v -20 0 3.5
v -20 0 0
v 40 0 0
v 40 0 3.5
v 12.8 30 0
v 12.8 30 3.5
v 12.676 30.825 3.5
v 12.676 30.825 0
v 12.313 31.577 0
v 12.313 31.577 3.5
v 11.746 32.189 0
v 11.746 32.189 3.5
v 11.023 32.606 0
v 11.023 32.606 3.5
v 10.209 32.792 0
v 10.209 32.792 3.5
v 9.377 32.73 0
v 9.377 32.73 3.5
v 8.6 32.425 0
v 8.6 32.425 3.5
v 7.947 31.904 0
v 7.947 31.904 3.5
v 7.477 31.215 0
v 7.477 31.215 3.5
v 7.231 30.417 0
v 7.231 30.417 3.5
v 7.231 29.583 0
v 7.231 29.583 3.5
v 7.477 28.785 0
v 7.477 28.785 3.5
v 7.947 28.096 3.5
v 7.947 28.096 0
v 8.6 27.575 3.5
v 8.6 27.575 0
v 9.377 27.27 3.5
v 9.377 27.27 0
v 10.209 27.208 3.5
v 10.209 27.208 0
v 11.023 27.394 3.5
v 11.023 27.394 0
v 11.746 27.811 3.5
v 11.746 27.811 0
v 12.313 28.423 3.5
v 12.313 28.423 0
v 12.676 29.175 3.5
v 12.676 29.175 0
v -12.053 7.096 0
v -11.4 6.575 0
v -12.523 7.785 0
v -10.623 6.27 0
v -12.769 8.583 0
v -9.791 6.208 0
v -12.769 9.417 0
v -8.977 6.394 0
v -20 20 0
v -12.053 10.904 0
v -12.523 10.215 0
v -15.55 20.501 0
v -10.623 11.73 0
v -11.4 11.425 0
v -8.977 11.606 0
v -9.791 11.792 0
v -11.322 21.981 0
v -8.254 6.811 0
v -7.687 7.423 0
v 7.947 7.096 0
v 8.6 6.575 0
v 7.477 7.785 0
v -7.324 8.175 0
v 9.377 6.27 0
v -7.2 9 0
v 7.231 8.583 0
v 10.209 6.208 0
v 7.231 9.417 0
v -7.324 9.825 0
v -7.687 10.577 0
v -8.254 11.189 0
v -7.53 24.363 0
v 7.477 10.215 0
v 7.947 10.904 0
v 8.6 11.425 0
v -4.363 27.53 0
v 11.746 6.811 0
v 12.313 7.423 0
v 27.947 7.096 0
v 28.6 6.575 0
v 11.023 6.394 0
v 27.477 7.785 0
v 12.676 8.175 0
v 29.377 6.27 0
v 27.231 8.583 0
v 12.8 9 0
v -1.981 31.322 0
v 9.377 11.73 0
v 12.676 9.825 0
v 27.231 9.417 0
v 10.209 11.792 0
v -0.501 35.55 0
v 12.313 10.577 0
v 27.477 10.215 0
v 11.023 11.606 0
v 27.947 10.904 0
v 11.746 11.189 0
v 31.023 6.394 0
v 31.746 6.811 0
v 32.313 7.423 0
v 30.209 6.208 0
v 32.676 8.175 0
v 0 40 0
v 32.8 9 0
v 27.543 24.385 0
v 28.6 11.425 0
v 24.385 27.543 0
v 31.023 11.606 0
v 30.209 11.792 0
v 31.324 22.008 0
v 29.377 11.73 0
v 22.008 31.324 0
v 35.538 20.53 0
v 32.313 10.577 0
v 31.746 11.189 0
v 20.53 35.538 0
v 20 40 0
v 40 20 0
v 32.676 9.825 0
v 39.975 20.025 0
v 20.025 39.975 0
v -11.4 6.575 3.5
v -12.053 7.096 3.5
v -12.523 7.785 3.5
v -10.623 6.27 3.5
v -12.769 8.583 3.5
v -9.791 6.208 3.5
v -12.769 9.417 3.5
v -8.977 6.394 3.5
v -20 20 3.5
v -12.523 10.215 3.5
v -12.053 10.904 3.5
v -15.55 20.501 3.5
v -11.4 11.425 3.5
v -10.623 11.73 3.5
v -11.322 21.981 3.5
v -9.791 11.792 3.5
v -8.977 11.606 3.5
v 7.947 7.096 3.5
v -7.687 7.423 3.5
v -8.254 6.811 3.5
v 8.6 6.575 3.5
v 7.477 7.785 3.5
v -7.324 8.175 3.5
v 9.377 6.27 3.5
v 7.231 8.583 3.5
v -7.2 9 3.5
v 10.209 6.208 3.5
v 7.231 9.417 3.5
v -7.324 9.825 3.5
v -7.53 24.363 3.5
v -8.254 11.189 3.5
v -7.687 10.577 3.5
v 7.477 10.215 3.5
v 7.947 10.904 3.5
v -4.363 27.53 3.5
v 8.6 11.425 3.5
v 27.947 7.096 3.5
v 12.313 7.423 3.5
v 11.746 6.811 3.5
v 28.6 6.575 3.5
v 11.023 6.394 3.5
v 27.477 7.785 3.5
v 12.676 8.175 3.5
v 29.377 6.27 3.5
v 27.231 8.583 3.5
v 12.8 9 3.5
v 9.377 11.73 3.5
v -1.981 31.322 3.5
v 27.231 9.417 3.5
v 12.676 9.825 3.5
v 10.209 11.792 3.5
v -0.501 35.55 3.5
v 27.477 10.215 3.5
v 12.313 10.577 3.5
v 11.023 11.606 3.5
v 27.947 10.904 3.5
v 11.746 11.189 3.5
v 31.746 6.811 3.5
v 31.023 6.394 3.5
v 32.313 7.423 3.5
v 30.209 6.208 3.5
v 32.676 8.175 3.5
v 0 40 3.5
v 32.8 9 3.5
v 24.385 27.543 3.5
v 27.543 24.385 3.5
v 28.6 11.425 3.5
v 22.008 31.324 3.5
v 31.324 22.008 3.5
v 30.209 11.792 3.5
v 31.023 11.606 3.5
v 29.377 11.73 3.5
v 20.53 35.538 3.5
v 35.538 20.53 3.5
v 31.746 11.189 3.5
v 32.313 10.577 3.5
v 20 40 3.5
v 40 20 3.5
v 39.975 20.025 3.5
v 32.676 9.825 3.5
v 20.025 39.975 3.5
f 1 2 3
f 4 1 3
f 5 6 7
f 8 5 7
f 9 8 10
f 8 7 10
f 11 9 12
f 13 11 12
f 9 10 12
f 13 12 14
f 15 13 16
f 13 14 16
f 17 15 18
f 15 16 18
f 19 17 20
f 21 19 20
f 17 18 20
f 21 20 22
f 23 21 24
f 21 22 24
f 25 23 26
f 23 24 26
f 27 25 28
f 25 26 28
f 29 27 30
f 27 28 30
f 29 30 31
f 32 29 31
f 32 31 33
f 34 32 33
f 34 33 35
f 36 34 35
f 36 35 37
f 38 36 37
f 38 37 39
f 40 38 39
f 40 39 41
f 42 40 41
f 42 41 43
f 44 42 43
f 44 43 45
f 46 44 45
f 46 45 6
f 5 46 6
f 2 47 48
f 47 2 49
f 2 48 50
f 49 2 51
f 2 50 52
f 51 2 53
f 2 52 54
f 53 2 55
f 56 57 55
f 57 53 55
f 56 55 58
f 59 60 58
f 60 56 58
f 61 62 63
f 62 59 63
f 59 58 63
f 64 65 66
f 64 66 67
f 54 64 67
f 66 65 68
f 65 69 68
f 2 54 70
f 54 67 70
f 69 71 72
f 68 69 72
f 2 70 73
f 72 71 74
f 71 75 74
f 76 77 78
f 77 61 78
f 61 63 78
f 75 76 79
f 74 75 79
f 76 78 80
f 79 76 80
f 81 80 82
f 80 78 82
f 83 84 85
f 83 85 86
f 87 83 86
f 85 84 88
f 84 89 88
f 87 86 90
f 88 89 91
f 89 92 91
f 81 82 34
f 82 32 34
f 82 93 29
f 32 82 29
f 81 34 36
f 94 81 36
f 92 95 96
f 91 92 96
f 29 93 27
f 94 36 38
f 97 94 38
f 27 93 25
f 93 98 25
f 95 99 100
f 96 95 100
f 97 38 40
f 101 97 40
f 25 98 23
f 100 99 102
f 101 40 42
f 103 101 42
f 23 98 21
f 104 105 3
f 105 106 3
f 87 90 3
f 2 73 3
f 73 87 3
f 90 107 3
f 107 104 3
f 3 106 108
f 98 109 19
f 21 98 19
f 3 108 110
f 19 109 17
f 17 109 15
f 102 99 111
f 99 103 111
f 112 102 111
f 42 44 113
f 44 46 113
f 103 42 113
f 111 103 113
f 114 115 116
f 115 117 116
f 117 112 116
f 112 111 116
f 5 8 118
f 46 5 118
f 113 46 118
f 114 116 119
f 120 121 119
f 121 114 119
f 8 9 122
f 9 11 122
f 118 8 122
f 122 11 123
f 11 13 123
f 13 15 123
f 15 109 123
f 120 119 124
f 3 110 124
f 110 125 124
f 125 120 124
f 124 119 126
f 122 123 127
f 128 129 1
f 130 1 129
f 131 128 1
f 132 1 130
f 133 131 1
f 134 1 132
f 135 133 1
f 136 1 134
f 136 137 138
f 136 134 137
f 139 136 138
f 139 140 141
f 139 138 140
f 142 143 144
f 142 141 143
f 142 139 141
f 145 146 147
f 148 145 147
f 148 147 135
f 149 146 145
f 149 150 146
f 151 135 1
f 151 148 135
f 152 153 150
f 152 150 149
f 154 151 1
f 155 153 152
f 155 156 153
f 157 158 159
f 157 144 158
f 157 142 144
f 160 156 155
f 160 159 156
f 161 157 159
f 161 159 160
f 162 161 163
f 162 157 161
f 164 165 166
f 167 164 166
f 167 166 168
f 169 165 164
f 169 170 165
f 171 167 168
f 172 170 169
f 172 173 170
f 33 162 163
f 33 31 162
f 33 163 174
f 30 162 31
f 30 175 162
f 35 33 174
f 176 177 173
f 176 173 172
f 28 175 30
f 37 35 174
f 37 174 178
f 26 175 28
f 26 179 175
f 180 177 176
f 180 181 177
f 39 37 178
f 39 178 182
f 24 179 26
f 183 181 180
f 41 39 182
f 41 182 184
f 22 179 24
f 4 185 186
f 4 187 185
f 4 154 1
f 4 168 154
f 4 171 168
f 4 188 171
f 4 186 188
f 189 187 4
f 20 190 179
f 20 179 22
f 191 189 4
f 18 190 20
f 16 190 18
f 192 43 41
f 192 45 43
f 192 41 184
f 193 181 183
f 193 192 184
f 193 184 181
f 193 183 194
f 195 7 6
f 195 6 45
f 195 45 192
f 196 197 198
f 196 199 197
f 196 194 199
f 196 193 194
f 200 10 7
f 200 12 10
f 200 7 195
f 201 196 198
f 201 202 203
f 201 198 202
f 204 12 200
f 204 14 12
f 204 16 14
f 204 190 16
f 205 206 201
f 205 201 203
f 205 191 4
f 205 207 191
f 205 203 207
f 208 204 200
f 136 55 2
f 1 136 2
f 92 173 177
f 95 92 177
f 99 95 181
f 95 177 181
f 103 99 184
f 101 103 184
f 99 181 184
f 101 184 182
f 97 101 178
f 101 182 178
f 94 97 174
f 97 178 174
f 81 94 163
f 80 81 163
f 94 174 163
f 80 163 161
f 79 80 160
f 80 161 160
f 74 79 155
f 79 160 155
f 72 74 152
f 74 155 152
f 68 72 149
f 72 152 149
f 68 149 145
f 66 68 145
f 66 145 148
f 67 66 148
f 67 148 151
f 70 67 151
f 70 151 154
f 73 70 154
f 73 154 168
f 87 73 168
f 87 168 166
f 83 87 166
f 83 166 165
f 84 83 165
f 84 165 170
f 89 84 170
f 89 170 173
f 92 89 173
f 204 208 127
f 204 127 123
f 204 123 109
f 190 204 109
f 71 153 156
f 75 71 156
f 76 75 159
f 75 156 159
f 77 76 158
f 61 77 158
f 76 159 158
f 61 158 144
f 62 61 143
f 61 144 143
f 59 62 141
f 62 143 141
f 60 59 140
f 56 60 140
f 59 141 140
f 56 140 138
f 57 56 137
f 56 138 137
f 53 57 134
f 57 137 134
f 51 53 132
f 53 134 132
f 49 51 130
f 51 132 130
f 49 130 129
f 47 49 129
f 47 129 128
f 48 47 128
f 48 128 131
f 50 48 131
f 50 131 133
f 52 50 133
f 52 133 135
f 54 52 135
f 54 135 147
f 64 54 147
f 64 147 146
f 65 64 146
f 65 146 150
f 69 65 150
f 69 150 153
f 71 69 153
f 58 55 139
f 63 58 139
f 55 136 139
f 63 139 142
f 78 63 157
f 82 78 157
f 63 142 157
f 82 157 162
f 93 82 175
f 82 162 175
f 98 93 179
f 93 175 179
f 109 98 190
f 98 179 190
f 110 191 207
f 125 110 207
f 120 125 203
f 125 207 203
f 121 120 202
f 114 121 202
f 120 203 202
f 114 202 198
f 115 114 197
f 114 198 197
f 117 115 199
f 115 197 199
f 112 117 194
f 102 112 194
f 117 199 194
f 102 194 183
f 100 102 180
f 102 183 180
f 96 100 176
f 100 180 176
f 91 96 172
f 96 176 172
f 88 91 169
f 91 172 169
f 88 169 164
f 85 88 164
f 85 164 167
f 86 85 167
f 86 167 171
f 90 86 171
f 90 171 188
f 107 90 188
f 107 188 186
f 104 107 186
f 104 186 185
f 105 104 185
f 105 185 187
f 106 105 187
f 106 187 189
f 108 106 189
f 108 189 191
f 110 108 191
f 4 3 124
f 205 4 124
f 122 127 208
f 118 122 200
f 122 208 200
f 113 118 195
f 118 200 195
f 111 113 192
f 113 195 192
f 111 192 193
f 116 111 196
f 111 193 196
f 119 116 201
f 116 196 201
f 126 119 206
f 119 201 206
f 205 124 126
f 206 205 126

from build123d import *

# Parameters (mm, degrees)
PAD_DEPTH     = 3.5
SKETCH001_R   = 2.8
SKETCH001_R_2 = 20
SKETCH001_R_3 = 19.975063
POCKET_DEPTH  = 3.501


with BuildPart() as part:
    # Sketch → Pad (new body)
    with BuildSketch(Plane.XY):
        Polygon((0, 0), (40, 0), (40, 20), (20, 40), (0, 40), (-20, 20), (-20, 0), align=None)
    extrude(amount=PAD_DEPTH)

    # Sketch001 → Pocket (cut, through all)
    with BuildSketch(Plane.XY.offset(3.5)):
        with Locations((10, 30)):
            Circle(SKETCH001_R)
        with Locations((10, 9)):
            Circle(SKETCH001_R)
        with Locations((30, 9)):
            Circle(SKETCH001_R)
        with Locations((-10, 9)):
            Circle(SKETCH001_R)
        with Locations((-20, 40)):
            Circle(SKETCH001_R_2)
        with Locations((40, 40)):
            Circle(SKETCH001_R_3)
    extrude(amount=-POCKET_DEPTH, mode=Mode.SUBTRACT)


solid = part.part
